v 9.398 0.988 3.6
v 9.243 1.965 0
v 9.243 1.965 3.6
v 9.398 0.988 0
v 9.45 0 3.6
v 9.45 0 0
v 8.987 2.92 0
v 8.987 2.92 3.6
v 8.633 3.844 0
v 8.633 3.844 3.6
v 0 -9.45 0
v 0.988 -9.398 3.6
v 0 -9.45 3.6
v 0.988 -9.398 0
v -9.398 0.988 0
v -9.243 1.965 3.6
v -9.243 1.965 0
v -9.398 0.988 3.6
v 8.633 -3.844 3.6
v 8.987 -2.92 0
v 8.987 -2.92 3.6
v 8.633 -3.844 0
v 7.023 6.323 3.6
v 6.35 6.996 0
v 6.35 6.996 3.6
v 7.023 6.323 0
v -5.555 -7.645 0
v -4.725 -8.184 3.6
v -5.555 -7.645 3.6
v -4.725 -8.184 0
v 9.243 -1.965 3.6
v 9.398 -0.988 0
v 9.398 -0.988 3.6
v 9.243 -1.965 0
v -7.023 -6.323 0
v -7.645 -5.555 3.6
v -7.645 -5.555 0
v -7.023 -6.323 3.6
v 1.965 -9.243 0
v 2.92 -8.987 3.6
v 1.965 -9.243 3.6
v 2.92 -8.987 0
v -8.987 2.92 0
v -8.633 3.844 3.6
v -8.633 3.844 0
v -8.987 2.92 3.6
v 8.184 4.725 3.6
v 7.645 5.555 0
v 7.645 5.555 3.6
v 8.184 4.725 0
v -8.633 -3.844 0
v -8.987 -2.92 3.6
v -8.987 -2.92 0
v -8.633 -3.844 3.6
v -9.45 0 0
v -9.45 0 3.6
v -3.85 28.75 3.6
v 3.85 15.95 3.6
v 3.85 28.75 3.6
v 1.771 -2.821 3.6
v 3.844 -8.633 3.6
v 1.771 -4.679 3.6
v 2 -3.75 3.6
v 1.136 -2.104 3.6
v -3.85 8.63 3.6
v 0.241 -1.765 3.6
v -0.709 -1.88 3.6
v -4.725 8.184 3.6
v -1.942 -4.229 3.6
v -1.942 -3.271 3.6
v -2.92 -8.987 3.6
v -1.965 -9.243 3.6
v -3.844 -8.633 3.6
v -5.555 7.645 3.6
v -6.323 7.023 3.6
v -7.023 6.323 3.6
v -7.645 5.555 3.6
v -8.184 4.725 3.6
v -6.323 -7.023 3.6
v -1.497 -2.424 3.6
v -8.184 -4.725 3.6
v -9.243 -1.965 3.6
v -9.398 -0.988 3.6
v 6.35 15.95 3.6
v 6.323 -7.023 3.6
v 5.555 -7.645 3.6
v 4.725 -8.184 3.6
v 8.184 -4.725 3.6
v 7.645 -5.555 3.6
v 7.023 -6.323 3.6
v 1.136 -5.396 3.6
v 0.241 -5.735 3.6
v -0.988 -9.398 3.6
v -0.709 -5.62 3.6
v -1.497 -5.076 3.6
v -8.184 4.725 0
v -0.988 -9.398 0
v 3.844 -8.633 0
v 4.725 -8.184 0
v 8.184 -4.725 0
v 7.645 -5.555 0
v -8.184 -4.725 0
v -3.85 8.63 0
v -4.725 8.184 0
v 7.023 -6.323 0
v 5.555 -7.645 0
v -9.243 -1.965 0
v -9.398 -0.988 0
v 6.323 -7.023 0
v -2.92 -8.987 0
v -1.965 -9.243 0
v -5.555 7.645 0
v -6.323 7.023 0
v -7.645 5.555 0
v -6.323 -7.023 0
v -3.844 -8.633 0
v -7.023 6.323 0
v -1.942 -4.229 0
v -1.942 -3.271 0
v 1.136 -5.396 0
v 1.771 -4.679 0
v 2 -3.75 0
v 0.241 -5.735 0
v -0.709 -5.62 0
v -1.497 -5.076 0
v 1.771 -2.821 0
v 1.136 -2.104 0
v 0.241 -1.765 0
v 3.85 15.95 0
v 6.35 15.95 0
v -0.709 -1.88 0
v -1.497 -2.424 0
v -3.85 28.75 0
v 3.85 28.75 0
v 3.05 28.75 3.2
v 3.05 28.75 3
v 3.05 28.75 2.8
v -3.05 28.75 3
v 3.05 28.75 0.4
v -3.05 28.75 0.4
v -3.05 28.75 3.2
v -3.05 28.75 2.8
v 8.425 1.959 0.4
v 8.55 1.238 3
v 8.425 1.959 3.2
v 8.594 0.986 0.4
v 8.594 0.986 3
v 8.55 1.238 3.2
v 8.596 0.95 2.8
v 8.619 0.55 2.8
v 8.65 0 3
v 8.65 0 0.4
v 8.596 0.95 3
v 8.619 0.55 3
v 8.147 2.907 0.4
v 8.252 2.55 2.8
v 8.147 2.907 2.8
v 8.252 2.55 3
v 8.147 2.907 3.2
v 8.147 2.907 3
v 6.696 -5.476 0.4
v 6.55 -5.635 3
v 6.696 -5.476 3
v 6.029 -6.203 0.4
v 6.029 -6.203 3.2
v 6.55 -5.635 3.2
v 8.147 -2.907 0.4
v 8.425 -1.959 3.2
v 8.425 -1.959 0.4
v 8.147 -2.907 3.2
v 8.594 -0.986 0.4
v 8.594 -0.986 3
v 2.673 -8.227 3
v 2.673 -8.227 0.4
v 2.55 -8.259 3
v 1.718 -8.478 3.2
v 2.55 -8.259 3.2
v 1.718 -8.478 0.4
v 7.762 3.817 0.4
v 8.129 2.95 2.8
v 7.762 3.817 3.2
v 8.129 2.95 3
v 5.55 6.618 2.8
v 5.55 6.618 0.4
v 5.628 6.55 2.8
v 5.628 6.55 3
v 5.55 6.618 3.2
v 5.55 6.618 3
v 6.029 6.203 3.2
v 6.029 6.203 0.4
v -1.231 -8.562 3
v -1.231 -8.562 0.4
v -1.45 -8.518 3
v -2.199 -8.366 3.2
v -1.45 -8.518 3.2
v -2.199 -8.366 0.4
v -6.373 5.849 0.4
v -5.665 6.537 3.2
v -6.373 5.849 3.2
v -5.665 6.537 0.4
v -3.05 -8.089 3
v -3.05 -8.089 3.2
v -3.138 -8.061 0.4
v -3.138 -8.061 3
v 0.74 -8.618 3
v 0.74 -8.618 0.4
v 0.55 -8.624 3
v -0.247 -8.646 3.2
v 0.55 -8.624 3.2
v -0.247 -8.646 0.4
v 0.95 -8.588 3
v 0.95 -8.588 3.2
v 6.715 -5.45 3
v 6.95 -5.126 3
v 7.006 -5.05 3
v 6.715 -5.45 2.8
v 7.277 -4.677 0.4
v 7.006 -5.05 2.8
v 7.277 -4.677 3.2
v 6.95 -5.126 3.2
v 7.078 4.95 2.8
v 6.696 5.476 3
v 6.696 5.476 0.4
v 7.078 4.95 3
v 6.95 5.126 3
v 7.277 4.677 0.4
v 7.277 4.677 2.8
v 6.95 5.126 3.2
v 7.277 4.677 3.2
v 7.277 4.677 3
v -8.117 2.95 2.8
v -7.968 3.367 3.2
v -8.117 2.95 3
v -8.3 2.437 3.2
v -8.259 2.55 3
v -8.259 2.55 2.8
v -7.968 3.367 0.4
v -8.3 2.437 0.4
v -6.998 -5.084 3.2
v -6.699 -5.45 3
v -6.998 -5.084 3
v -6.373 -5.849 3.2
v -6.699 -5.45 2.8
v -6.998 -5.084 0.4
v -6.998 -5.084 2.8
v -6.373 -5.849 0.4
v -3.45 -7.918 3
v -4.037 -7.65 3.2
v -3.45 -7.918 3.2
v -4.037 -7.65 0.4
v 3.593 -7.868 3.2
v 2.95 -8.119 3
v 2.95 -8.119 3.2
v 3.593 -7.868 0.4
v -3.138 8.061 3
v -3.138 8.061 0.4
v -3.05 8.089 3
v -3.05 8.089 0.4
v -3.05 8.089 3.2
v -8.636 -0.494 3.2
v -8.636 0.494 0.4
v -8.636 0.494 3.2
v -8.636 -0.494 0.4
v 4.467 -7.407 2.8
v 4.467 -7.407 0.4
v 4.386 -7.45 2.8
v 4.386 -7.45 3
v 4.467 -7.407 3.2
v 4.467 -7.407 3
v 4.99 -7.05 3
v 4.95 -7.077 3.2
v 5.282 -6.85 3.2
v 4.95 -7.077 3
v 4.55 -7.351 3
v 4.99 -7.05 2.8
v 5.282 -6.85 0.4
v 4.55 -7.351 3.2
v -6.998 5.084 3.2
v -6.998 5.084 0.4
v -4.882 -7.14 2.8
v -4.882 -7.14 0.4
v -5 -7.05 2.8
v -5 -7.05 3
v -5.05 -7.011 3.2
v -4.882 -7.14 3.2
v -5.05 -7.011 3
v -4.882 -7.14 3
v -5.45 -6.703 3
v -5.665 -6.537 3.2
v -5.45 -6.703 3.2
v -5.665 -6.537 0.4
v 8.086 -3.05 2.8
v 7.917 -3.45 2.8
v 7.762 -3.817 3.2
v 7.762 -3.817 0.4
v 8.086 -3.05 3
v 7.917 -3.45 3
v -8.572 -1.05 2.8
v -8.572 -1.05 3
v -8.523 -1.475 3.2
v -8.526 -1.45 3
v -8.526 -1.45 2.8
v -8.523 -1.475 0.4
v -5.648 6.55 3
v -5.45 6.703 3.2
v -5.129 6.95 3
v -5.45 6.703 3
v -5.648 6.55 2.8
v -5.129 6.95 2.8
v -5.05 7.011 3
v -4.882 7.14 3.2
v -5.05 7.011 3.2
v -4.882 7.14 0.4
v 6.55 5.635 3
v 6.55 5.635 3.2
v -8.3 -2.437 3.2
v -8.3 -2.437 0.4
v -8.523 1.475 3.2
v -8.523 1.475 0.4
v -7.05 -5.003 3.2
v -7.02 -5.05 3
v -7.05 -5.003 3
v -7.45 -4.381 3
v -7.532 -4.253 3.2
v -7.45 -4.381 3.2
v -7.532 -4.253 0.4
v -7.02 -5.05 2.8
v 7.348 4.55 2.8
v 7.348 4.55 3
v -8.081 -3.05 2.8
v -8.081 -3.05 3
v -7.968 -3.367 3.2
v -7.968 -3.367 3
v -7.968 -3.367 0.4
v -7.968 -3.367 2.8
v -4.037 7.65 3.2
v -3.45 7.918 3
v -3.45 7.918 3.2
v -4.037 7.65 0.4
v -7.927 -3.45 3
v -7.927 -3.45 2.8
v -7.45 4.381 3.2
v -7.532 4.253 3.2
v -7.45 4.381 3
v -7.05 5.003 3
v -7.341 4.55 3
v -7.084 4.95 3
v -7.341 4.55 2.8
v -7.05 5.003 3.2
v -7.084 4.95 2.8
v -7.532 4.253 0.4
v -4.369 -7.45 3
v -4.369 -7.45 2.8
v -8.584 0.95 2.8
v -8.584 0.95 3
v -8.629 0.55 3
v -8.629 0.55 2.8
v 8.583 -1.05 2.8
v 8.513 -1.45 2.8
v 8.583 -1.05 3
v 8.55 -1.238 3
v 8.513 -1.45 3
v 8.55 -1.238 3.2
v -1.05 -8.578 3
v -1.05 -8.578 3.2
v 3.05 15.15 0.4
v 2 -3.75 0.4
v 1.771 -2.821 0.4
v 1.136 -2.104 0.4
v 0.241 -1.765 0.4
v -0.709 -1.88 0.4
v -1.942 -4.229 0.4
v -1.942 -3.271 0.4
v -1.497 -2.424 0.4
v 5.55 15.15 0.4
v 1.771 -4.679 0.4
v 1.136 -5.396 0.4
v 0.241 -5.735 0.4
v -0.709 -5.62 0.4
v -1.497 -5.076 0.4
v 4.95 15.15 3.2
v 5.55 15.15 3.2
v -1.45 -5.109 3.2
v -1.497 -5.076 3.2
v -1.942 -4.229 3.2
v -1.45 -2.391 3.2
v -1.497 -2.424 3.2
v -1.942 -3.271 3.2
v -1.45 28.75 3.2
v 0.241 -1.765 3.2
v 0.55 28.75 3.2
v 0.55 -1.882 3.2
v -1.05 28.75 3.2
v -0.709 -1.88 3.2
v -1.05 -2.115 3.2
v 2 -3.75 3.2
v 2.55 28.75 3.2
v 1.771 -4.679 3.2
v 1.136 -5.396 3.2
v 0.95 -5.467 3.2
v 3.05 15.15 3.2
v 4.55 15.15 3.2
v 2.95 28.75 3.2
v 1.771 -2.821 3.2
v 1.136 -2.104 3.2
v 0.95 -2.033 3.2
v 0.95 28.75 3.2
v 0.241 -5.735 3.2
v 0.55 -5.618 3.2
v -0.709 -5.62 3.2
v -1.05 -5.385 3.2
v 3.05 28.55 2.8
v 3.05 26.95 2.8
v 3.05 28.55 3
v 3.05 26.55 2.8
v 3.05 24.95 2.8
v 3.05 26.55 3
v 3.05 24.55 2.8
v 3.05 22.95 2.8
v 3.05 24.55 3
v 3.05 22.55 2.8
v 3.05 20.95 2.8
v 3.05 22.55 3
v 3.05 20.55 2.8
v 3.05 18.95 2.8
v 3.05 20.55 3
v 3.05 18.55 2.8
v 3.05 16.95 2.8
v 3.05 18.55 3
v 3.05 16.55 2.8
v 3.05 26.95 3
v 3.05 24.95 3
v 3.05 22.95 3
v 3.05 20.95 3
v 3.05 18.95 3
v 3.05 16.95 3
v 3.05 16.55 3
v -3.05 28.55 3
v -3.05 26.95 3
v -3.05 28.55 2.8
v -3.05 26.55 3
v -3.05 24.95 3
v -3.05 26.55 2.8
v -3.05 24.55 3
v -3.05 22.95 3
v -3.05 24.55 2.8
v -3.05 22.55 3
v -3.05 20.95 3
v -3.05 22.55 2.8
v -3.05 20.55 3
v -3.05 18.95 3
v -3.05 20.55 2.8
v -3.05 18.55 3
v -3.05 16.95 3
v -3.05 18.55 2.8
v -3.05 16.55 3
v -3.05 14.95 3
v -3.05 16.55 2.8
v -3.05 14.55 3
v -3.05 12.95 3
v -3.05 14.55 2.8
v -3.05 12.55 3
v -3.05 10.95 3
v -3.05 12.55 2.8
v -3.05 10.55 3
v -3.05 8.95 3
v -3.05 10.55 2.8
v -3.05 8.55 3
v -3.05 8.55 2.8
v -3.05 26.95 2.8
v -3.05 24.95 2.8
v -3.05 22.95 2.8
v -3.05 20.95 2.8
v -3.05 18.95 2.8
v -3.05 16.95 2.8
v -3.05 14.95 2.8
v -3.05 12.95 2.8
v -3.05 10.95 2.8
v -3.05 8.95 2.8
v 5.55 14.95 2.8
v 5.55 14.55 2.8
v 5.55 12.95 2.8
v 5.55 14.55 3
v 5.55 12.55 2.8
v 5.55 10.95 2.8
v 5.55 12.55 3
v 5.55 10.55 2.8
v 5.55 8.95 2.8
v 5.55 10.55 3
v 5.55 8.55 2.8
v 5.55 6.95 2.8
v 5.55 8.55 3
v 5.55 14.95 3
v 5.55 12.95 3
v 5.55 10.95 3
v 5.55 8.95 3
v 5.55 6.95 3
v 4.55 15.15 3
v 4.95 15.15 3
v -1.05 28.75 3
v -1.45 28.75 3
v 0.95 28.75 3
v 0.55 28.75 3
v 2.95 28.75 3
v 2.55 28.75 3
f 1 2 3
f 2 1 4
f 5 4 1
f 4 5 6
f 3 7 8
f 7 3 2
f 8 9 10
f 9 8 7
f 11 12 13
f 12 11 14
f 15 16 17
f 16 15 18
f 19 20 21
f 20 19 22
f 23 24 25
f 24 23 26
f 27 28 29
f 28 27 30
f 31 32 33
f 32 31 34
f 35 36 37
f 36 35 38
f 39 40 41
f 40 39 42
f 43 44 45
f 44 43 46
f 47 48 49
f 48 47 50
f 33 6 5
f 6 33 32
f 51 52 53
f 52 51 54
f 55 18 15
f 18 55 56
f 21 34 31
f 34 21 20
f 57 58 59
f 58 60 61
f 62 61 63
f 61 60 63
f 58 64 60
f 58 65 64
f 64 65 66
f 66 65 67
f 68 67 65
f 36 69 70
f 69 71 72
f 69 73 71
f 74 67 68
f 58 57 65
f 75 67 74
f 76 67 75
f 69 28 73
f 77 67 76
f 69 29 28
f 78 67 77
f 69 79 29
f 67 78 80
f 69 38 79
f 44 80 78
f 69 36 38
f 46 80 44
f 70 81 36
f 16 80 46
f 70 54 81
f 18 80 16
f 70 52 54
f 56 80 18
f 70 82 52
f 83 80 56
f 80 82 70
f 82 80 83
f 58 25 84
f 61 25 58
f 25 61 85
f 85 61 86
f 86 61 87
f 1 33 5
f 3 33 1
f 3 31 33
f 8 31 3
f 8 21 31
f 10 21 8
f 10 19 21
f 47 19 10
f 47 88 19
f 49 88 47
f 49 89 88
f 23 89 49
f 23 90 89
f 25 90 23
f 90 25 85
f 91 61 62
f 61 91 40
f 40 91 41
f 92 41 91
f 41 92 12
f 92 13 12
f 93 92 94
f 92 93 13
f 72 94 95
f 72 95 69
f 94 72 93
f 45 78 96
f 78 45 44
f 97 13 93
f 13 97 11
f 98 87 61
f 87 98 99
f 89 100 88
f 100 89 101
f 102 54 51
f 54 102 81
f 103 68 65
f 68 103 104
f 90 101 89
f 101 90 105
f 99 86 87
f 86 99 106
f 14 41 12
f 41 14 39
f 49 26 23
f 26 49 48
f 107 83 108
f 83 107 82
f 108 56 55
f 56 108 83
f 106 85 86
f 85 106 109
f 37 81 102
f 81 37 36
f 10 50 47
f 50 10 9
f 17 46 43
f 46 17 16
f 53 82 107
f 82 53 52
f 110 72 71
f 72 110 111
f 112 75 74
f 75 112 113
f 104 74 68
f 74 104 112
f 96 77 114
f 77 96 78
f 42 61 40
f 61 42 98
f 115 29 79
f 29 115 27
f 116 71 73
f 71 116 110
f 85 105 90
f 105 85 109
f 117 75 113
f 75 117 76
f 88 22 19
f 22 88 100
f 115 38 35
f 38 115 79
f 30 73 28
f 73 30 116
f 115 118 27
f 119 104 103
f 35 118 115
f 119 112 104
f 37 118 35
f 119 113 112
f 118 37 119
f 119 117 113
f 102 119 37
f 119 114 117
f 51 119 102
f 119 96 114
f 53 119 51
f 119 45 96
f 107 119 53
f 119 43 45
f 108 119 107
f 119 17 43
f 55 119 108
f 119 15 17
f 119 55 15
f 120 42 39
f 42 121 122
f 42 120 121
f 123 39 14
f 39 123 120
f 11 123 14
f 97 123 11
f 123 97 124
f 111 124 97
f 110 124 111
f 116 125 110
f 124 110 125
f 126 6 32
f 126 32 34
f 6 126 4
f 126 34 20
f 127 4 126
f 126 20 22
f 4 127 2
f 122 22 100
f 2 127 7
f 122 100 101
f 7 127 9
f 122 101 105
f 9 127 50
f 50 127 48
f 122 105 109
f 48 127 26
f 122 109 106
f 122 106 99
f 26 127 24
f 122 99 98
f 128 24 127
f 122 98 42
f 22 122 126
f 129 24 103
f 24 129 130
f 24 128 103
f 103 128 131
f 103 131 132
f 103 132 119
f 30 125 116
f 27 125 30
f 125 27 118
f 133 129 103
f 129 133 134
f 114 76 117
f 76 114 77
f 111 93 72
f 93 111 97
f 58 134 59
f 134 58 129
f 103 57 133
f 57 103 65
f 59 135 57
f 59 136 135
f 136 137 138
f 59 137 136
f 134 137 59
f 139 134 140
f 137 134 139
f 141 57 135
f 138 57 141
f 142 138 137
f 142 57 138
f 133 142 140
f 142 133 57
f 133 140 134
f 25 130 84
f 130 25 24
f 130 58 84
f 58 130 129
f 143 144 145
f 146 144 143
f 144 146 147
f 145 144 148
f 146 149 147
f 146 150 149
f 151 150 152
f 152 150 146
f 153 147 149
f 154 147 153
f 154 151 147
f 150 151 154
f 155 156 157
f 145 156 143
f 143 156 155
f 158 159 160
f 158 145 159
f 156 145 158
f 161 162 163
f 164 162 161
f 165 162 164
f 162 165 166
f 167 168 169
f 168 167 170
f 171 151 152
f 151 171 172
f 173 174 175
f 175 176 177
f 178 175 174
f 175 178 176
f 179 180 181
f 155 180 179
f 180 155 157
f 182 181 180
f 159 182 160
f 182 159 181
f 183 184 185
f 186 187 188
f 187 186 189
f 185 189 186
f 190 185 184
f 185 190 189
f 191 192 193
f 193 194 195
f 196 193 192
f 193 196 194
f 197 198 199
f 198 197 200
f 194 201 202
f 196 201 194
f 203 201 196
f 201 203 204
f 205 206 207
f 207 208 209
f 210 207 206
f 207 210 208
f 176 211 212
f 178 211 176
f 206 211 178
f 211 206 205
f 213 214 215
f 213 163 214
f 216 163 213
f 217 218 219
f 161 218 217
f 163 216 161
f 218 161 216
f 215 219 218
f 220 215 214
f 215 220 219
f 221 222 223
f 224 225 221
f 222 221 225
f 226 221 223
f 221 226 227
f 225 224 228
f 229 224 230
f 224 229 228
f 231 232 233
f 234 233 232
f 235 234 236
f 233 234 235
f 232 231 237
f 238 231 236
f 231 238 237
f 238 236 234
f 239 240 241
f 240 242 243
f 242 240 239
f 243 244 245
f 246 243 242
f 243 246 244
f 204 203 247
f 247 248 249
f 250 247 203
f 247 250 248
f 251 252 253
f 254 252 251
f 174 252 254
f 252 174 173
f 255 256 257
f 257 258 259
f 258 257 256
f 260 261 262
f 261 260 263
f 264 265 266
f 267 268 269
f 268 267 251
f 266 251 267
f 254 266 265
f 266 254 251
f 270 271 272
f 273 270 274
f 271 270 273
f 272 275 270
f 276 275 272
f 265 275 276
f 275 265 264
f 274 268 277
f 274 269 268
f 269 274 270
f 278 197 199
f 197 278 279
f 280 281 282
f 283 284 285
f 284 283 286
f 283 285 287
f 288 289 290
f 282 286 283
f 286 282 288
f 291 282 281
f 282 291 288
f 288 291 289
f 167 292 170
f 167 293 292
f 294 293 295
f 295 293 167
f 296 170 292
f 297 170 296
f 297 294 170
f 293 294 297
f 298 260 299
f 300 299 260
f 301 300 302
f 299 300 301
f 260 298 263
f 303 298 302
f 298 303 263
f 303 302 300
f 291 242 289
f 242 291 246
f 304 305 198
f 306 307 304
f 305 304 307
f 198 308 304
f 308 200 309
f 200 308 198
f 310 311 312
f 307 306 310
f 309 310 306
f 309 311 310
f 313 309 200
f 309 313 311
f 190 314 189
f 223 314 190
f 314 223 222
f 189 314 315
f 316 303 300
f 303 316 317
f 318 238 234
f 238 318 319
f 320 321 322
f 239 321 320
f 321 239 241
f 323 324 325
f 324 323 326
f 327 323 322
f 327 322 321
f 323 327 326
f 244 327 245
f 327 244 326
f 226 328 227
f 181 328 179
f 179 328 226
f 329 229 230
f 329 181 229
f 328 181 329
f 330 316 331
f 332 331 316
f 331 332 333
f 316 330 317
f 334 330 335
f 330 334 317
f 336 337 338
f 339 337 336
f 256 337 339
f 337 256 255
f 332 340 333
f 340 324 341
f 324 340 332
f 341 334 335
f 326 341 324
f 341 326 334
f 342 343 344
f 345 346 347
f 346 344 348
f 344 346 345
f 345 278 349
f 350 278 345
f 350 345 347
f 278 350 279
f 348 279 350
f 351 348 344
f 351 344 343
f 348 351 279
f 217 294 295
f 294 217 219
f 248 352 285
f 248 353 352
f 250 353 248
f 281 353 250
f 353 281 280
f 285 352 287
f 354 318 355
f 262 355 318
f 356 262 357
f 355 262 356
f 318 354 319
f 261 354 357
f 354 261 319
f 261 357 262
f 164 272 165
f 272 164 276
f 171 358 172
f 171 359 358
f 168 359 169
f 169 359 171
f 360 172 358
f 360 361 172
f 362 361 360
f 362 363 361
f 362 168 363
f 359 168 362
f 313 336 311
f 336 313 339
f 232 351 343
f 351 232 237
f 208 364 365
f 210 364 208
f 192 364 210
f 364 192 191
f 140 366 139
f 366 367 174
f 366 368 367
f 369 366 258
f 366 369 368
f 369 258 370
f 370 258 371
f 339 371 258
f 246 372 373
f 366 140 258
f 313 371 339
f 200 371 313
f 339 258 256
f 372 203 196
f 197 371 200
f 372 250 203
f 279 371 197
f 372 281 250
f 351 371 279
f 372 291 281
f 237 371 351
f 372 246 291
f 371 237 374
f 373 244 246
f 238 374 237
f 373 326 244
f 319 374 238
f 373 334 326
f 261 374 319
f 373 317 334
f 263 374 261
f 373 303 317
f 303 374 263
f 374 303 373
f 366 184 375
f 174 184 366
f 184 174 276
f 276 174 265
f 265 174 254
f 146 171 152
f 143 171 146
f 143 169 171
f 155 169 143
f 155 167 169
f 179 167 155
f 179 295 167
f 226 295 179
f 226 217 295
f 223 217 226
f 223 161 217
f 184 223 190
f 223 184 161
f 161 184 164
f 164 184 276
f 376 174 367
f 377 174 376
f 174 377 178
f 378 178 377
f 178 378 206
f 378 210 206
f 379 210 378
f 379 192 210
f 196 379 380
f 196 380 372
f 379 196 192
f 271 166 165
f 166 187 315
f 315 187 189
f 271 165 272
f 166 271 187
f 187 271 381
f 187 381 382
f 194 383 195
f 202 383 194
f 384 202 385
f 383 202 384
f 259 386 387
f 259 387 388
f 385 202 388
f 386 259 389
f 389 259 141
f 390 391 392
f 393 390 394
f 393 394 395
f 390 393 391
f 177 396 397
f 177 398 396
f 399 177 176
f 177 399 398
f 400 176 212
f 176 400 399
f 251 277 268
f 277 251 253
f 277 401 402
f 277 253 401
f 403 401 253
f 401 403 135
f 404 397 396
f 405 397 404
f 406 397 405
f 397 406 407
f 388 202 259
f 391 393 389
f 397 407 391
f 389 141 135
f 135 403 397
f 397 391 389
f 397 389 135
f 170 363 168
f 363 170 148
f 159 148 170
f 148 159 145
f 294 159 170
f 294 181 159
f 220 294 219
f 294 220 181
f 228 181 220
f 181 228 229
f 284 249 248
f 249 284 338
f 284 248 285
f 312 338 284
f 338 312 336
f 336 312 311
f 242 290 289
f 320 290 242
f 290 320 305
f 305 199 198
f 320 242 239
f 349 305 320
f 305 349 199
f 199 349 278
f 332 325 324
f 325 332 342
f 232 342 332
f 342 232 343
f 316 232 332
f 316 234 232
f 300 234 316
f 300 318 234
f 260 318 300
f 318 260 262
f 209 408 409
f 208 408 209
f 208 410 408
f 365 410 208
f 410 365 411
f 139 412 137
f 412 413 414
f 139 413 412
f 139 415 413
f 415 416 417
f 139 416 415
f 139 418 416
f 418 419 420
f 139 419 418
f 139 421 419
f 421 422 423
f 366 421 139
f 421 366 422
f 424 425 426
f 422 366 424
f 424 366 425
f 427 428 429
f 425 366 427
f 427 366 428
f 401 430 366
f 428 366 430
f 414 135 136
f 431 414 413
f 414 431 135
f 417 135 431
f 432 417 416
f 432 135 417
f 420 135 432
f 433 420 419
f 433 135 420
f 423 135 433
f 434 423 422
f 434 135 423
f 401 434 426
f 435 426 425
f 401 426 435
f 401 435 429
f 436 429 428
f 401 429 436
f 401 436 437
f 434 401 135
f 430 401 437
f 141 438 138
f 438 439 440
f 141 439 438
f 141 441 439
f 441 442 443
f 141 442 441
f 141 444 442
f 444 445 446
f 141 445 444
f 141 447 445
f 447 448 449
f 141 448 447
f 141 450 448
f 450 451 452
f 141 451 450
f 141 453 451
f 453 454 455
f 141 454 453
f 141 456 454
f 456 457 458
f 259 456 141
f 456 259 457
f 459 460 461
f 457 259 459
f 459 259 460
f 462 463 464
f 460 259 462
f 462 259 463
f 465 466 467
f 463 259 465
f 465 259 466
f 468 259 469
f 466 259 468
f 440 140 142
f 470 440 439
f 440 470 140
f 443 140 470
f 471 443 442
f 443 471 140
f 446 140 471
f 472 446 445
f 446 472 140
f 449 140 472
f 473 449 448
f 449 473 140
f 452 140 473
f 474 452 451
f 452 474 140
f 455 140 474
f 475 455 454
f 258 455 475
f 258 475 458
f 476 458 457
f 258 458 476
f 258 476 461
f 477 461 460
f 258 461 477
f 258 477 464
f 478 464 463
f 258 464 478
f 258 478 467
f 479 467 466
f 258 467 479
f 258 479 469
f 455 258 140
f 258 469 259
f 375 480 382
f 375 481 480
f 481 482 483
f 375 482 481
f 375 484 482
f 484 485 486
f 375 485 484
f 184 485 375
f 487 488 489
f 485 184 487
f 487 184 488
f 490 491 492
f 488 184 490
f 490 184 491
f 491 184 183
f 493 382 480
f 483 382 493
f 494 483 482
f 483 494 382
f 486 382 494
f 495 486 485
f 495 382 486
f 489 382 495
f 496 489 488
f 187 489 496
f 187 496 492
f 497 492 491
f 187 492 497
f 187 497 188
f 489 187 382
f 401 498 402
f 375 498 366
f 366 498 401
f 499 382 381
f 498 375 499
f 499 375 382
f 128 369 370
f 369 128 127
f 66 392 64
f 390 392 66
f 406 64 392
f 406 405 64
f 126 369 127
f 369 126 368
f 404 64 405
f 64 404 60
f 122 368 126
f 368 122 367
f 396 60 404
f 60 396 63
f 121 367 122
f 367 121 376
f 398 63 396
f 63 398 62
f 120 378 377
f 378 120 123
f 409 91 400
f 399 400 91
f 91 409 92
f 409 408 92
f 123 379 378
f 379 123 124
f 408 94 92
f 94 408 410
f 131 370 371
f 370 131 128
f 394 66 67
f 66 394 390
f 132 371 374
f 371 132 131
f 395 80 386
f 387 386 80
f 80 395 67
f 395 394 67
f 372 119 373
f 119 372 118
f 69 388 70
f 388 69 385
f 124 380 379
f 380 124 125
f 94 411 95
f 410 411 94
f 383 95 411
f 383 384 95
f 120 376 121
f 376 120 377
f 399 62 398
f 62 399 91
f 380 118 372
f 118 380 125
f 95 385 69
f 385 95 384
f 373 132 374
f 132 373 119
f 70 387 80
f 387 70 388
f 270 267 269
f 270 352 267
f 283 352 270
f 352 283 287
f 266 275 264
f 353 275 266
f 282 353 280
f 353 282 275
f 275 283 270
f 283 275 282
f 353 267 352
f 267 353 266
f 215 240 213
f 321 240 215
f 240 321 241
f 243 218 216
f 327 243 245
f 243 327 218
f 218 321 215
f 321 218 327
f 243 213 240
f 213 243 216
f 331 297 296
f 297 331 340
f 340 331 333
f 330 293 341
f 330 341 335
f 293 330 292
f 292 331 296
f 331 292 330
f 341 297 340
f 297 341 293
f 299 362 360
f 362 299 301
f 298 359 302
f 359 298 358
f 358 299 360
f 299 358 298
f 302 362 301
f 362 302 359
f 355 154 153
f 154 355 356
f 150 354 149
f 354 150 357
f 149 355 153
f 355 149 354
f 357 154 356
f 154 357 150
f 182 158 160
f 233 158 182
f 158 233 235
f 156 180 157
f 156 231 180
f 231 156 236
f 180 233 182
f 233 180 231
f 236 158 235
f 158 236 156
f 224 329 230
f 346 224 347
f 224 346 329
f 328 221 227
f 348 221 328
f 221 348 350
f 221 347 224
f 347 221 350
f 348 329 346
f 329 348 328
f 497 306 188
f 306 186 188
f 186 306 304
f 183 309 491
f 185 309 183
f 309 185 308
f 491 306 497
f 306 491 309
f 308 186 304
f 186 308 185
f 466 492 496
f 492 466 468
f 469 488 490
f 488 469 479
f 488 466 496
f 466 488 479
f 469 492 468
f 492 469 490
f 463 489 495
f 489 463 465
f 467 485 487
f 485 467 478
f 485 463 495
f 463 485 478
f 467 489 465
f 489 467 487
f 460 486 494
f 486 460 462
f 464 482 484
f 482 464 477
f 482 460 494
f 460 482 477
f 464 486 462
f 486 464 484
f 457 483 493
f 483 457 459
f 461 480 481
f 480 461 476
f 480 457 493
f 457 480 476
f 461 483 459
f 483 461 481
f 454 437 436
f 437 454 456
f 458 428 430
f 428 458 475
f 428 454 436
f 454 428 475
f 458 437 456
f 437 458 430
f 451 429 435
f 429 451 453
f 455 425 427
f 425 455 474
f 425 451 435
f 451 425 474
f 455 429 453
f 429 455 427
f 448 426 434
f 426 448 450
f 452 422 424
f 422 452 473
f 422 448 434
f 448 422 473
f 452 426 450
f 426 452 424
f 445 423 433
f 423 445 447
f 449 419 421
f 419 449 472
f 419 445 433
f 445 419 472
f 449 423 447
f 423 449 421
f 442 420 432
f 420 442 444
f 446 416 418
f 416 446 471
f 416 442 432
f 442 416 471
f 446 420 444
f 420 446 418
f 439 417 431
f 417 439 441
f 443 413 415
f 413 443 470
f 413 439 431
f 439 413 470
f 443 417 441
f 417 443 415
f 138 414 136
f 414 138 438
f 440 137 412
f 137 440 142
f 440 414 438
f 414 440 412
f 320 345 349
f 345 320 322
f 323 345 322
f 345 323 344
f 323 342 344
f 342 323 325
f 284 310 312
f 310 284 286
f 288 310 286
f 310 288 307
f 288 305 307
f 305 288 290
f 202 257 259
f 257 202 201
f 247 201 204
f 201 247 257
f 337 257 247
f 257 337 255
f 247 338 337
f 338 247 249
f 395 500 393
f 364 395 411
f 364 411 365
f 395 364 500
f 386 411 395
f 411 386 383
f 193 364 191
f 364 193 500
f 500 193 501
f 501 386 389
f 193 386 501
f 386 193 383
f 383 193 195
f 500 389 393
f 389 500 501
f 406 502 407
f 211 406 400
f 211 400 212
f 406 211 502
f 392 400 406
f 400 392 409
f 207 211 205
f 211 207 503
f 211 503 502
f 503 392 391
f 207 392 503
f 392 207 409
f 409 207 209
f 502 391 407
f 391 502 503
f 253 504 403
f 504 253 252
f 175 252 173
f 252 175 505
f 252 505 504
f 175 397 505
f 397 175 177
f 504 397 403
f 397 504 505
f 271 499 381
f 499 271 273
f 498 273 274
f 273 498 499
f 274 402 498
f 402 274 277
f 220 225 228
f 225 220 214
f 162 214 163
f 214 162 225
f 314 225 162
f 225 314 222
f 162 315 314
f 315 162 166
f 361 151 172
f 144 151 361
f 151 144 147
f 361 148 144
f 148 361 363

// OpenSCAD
// -*- mode: SCAD ; c-file-style: "ellemtel" ; coding: utf-8 -*-
//
// Key seal.
//
// Copyright 2018 Roland Sieker <ospalh@gmail.com>
// Licence: CC-BY-SA 4.0

// The bow is the "grip" of the key
bow_shape = 0; // [0: circular, 1: rectangular]

// Diameter of the key's circular bow.
bow_diameter = 16.5;  // [5:0.1:40]

// Size of the rectangular bow normal to the insertion direction
bow_width = 19;  // [5:0.1:40]

// Size of the rectangular bow in insertion direction
bow_length = 12;  // [5:0.1:40]


// Thickness of the key.
thickness = 2;  // [0.5:0.1:5]


// The length of the bit you insert into the lock from tip to bow
blade_length = 18.5;  // [5:0.1:40]

// The width of the blade
blade_width = 5.3;  // [1:0.1:20]

// The shoulder is the bit that stops you from pushing in the key too far. This is the extra width of the protrusion.
shoulder_width = 2.5;  // [1:0.1:10]

// Distance from the bow to the shoulder.
shoulder_length = 6.5;  // [1:0.1:15]

// Key ring hole diameter
ring_hole_diameter = 4;  // [0.5:0.1:5]

// Distance of the ring hole from the edge of the key
ring_hole_land = 2.5;  // [0.5:0.1:5]

// How much the ring hole is offset towards the cuts and shoulder side. Manual correction of the land width needed for circular bows.
ring_hole_offset = 0;  // [-20:0.1:20]

// Set this to "render" and click on "Create Thing" when done with the setup.
preview = 1; // [0:render, 1:preview]


/* [Hidden] */

// Done with the customizer.

// *******************************************************
// Extra parameters. These can be changed reasonably safely.

w = 0.8;  // external wall width
p = 0.4;  // height of the bottomt plate
c = 0.4;  // clearance

lh = 0.2; // layer height
nw = 0.4;  // nozzle width

sh = lh * 2;  // We do two layers of strakes or stringers

// *******************************************************
// Some shortcuts. These shouldn't be changed

angle = 60; // Overhangs much below 60 degrees are a problem for me
xy_factor = 1/tan(angle);  // To get from a height to a horizontal width
                           // inclined correctly
z_factor = tan(angle);  // the other way around

rb = bow_shape ? bow_length/2 : bow_diameter / 2;
kw = bow_shape ? bow_width/2 : bow_diameter / 2;
h = thickness;

some_distance = 50;
ms = 0.01;  // Muggeseggele.

// fn for differently sized objects and fs, fa,  all for preview or rendering.
pna = 40;
pnb = 15;
pa = 5;
ps = 1;
rna = 180;
rnb = 30;
ra = 1;
rs = 0.1;
function na() = (preview) ? pna : rna;
function nb() = (preview) ? pnb : rnb;
$fs = (preview) ? ps : rs;
$fa = (preview) ? pa : ra;

// *******************************************************
// End setup



// *******************************************************
// Generate the part

key_seal();

// Test
// %solid_key_seal();
// %key_hollow();
// #strakes();

// *******************************************************
// Code for the parts themselves


module key_seal()
{
   difference()
   {
      solid_key_seal();
      key_hollow();
   }
   intersection()
   {
      solid_key_seal();
      strakes();
   }
}

module solid_key_seal()
{

   if (bow_shape)
   {
      translate([-bow_width/2-c-w, -bow_length/2-c-w, 0])
      {
         cube([bow_width+2*c+2*w, bow_length+2*c+2*w, h+2*p+c+sh]);
      }
   }
   else
   {
      cylinder(r=rb+w+c, h=h+2*p+c+sh);
   }
   translate([-blade_width/2-c-w, 0, 0])
      {
         cube([blade_width+2*c+2*w, blade_length+w+rb+w+c, h+2*p+c+sh]);
      }
   cube([blade_width/2+shoulder_width+c+w, rb+shoulder_length+c+w, h+2*p+c+sh]);
}

module key_hollow()
{
   translate([0,0,p])
   {
      if (bow_shape)
      {
         translate([-bow_width/2-c, -bow_length/2-c, 0])
         {
            cube([bow_width+2*c, bow_length+2*c, h+c+sh]);
         }
      }
      else
      {
         cylinder(r=rb+c, h=h+c+sh);
      }
      translate([-blade_width/2-c, 0, 0])
      {
         cube([blade_width+2*c, some_distance, h+c+sh]);
      }
      cube([blade_width/2+shoulder_width+c, rb+shoulder_length+c, h+c+sh]);
   }
   translate([ring_hole_offset, -rb + ring_hole_land + ring_hole_diameter/2,-ms])
   {
      cylinder(d=ring_hole_diameter, h=h+2*p+c+sh+2*ms);
   }
}


module strakes()
{

   translate([-rb-c-w,-kw-c-w,h+p+c])
   {
      for (so=[0:5*nw: blade_length+w+2*rb+2*w+2*c])
      {
         translate([0,so,0])
         {
            cube([2*rb+2*c+2*w, nw, lh]);
         }
      }

      translate([0,0, lh])
      {
         for (st=[0:5*nw: 2*rb+2*w+2*c])
         {
            translate([st, 0, 0])
            {
               cube([nw, blade_length+w+2*rb+2*w+2*c, lh]);
            }
         }
      }
   }
}
